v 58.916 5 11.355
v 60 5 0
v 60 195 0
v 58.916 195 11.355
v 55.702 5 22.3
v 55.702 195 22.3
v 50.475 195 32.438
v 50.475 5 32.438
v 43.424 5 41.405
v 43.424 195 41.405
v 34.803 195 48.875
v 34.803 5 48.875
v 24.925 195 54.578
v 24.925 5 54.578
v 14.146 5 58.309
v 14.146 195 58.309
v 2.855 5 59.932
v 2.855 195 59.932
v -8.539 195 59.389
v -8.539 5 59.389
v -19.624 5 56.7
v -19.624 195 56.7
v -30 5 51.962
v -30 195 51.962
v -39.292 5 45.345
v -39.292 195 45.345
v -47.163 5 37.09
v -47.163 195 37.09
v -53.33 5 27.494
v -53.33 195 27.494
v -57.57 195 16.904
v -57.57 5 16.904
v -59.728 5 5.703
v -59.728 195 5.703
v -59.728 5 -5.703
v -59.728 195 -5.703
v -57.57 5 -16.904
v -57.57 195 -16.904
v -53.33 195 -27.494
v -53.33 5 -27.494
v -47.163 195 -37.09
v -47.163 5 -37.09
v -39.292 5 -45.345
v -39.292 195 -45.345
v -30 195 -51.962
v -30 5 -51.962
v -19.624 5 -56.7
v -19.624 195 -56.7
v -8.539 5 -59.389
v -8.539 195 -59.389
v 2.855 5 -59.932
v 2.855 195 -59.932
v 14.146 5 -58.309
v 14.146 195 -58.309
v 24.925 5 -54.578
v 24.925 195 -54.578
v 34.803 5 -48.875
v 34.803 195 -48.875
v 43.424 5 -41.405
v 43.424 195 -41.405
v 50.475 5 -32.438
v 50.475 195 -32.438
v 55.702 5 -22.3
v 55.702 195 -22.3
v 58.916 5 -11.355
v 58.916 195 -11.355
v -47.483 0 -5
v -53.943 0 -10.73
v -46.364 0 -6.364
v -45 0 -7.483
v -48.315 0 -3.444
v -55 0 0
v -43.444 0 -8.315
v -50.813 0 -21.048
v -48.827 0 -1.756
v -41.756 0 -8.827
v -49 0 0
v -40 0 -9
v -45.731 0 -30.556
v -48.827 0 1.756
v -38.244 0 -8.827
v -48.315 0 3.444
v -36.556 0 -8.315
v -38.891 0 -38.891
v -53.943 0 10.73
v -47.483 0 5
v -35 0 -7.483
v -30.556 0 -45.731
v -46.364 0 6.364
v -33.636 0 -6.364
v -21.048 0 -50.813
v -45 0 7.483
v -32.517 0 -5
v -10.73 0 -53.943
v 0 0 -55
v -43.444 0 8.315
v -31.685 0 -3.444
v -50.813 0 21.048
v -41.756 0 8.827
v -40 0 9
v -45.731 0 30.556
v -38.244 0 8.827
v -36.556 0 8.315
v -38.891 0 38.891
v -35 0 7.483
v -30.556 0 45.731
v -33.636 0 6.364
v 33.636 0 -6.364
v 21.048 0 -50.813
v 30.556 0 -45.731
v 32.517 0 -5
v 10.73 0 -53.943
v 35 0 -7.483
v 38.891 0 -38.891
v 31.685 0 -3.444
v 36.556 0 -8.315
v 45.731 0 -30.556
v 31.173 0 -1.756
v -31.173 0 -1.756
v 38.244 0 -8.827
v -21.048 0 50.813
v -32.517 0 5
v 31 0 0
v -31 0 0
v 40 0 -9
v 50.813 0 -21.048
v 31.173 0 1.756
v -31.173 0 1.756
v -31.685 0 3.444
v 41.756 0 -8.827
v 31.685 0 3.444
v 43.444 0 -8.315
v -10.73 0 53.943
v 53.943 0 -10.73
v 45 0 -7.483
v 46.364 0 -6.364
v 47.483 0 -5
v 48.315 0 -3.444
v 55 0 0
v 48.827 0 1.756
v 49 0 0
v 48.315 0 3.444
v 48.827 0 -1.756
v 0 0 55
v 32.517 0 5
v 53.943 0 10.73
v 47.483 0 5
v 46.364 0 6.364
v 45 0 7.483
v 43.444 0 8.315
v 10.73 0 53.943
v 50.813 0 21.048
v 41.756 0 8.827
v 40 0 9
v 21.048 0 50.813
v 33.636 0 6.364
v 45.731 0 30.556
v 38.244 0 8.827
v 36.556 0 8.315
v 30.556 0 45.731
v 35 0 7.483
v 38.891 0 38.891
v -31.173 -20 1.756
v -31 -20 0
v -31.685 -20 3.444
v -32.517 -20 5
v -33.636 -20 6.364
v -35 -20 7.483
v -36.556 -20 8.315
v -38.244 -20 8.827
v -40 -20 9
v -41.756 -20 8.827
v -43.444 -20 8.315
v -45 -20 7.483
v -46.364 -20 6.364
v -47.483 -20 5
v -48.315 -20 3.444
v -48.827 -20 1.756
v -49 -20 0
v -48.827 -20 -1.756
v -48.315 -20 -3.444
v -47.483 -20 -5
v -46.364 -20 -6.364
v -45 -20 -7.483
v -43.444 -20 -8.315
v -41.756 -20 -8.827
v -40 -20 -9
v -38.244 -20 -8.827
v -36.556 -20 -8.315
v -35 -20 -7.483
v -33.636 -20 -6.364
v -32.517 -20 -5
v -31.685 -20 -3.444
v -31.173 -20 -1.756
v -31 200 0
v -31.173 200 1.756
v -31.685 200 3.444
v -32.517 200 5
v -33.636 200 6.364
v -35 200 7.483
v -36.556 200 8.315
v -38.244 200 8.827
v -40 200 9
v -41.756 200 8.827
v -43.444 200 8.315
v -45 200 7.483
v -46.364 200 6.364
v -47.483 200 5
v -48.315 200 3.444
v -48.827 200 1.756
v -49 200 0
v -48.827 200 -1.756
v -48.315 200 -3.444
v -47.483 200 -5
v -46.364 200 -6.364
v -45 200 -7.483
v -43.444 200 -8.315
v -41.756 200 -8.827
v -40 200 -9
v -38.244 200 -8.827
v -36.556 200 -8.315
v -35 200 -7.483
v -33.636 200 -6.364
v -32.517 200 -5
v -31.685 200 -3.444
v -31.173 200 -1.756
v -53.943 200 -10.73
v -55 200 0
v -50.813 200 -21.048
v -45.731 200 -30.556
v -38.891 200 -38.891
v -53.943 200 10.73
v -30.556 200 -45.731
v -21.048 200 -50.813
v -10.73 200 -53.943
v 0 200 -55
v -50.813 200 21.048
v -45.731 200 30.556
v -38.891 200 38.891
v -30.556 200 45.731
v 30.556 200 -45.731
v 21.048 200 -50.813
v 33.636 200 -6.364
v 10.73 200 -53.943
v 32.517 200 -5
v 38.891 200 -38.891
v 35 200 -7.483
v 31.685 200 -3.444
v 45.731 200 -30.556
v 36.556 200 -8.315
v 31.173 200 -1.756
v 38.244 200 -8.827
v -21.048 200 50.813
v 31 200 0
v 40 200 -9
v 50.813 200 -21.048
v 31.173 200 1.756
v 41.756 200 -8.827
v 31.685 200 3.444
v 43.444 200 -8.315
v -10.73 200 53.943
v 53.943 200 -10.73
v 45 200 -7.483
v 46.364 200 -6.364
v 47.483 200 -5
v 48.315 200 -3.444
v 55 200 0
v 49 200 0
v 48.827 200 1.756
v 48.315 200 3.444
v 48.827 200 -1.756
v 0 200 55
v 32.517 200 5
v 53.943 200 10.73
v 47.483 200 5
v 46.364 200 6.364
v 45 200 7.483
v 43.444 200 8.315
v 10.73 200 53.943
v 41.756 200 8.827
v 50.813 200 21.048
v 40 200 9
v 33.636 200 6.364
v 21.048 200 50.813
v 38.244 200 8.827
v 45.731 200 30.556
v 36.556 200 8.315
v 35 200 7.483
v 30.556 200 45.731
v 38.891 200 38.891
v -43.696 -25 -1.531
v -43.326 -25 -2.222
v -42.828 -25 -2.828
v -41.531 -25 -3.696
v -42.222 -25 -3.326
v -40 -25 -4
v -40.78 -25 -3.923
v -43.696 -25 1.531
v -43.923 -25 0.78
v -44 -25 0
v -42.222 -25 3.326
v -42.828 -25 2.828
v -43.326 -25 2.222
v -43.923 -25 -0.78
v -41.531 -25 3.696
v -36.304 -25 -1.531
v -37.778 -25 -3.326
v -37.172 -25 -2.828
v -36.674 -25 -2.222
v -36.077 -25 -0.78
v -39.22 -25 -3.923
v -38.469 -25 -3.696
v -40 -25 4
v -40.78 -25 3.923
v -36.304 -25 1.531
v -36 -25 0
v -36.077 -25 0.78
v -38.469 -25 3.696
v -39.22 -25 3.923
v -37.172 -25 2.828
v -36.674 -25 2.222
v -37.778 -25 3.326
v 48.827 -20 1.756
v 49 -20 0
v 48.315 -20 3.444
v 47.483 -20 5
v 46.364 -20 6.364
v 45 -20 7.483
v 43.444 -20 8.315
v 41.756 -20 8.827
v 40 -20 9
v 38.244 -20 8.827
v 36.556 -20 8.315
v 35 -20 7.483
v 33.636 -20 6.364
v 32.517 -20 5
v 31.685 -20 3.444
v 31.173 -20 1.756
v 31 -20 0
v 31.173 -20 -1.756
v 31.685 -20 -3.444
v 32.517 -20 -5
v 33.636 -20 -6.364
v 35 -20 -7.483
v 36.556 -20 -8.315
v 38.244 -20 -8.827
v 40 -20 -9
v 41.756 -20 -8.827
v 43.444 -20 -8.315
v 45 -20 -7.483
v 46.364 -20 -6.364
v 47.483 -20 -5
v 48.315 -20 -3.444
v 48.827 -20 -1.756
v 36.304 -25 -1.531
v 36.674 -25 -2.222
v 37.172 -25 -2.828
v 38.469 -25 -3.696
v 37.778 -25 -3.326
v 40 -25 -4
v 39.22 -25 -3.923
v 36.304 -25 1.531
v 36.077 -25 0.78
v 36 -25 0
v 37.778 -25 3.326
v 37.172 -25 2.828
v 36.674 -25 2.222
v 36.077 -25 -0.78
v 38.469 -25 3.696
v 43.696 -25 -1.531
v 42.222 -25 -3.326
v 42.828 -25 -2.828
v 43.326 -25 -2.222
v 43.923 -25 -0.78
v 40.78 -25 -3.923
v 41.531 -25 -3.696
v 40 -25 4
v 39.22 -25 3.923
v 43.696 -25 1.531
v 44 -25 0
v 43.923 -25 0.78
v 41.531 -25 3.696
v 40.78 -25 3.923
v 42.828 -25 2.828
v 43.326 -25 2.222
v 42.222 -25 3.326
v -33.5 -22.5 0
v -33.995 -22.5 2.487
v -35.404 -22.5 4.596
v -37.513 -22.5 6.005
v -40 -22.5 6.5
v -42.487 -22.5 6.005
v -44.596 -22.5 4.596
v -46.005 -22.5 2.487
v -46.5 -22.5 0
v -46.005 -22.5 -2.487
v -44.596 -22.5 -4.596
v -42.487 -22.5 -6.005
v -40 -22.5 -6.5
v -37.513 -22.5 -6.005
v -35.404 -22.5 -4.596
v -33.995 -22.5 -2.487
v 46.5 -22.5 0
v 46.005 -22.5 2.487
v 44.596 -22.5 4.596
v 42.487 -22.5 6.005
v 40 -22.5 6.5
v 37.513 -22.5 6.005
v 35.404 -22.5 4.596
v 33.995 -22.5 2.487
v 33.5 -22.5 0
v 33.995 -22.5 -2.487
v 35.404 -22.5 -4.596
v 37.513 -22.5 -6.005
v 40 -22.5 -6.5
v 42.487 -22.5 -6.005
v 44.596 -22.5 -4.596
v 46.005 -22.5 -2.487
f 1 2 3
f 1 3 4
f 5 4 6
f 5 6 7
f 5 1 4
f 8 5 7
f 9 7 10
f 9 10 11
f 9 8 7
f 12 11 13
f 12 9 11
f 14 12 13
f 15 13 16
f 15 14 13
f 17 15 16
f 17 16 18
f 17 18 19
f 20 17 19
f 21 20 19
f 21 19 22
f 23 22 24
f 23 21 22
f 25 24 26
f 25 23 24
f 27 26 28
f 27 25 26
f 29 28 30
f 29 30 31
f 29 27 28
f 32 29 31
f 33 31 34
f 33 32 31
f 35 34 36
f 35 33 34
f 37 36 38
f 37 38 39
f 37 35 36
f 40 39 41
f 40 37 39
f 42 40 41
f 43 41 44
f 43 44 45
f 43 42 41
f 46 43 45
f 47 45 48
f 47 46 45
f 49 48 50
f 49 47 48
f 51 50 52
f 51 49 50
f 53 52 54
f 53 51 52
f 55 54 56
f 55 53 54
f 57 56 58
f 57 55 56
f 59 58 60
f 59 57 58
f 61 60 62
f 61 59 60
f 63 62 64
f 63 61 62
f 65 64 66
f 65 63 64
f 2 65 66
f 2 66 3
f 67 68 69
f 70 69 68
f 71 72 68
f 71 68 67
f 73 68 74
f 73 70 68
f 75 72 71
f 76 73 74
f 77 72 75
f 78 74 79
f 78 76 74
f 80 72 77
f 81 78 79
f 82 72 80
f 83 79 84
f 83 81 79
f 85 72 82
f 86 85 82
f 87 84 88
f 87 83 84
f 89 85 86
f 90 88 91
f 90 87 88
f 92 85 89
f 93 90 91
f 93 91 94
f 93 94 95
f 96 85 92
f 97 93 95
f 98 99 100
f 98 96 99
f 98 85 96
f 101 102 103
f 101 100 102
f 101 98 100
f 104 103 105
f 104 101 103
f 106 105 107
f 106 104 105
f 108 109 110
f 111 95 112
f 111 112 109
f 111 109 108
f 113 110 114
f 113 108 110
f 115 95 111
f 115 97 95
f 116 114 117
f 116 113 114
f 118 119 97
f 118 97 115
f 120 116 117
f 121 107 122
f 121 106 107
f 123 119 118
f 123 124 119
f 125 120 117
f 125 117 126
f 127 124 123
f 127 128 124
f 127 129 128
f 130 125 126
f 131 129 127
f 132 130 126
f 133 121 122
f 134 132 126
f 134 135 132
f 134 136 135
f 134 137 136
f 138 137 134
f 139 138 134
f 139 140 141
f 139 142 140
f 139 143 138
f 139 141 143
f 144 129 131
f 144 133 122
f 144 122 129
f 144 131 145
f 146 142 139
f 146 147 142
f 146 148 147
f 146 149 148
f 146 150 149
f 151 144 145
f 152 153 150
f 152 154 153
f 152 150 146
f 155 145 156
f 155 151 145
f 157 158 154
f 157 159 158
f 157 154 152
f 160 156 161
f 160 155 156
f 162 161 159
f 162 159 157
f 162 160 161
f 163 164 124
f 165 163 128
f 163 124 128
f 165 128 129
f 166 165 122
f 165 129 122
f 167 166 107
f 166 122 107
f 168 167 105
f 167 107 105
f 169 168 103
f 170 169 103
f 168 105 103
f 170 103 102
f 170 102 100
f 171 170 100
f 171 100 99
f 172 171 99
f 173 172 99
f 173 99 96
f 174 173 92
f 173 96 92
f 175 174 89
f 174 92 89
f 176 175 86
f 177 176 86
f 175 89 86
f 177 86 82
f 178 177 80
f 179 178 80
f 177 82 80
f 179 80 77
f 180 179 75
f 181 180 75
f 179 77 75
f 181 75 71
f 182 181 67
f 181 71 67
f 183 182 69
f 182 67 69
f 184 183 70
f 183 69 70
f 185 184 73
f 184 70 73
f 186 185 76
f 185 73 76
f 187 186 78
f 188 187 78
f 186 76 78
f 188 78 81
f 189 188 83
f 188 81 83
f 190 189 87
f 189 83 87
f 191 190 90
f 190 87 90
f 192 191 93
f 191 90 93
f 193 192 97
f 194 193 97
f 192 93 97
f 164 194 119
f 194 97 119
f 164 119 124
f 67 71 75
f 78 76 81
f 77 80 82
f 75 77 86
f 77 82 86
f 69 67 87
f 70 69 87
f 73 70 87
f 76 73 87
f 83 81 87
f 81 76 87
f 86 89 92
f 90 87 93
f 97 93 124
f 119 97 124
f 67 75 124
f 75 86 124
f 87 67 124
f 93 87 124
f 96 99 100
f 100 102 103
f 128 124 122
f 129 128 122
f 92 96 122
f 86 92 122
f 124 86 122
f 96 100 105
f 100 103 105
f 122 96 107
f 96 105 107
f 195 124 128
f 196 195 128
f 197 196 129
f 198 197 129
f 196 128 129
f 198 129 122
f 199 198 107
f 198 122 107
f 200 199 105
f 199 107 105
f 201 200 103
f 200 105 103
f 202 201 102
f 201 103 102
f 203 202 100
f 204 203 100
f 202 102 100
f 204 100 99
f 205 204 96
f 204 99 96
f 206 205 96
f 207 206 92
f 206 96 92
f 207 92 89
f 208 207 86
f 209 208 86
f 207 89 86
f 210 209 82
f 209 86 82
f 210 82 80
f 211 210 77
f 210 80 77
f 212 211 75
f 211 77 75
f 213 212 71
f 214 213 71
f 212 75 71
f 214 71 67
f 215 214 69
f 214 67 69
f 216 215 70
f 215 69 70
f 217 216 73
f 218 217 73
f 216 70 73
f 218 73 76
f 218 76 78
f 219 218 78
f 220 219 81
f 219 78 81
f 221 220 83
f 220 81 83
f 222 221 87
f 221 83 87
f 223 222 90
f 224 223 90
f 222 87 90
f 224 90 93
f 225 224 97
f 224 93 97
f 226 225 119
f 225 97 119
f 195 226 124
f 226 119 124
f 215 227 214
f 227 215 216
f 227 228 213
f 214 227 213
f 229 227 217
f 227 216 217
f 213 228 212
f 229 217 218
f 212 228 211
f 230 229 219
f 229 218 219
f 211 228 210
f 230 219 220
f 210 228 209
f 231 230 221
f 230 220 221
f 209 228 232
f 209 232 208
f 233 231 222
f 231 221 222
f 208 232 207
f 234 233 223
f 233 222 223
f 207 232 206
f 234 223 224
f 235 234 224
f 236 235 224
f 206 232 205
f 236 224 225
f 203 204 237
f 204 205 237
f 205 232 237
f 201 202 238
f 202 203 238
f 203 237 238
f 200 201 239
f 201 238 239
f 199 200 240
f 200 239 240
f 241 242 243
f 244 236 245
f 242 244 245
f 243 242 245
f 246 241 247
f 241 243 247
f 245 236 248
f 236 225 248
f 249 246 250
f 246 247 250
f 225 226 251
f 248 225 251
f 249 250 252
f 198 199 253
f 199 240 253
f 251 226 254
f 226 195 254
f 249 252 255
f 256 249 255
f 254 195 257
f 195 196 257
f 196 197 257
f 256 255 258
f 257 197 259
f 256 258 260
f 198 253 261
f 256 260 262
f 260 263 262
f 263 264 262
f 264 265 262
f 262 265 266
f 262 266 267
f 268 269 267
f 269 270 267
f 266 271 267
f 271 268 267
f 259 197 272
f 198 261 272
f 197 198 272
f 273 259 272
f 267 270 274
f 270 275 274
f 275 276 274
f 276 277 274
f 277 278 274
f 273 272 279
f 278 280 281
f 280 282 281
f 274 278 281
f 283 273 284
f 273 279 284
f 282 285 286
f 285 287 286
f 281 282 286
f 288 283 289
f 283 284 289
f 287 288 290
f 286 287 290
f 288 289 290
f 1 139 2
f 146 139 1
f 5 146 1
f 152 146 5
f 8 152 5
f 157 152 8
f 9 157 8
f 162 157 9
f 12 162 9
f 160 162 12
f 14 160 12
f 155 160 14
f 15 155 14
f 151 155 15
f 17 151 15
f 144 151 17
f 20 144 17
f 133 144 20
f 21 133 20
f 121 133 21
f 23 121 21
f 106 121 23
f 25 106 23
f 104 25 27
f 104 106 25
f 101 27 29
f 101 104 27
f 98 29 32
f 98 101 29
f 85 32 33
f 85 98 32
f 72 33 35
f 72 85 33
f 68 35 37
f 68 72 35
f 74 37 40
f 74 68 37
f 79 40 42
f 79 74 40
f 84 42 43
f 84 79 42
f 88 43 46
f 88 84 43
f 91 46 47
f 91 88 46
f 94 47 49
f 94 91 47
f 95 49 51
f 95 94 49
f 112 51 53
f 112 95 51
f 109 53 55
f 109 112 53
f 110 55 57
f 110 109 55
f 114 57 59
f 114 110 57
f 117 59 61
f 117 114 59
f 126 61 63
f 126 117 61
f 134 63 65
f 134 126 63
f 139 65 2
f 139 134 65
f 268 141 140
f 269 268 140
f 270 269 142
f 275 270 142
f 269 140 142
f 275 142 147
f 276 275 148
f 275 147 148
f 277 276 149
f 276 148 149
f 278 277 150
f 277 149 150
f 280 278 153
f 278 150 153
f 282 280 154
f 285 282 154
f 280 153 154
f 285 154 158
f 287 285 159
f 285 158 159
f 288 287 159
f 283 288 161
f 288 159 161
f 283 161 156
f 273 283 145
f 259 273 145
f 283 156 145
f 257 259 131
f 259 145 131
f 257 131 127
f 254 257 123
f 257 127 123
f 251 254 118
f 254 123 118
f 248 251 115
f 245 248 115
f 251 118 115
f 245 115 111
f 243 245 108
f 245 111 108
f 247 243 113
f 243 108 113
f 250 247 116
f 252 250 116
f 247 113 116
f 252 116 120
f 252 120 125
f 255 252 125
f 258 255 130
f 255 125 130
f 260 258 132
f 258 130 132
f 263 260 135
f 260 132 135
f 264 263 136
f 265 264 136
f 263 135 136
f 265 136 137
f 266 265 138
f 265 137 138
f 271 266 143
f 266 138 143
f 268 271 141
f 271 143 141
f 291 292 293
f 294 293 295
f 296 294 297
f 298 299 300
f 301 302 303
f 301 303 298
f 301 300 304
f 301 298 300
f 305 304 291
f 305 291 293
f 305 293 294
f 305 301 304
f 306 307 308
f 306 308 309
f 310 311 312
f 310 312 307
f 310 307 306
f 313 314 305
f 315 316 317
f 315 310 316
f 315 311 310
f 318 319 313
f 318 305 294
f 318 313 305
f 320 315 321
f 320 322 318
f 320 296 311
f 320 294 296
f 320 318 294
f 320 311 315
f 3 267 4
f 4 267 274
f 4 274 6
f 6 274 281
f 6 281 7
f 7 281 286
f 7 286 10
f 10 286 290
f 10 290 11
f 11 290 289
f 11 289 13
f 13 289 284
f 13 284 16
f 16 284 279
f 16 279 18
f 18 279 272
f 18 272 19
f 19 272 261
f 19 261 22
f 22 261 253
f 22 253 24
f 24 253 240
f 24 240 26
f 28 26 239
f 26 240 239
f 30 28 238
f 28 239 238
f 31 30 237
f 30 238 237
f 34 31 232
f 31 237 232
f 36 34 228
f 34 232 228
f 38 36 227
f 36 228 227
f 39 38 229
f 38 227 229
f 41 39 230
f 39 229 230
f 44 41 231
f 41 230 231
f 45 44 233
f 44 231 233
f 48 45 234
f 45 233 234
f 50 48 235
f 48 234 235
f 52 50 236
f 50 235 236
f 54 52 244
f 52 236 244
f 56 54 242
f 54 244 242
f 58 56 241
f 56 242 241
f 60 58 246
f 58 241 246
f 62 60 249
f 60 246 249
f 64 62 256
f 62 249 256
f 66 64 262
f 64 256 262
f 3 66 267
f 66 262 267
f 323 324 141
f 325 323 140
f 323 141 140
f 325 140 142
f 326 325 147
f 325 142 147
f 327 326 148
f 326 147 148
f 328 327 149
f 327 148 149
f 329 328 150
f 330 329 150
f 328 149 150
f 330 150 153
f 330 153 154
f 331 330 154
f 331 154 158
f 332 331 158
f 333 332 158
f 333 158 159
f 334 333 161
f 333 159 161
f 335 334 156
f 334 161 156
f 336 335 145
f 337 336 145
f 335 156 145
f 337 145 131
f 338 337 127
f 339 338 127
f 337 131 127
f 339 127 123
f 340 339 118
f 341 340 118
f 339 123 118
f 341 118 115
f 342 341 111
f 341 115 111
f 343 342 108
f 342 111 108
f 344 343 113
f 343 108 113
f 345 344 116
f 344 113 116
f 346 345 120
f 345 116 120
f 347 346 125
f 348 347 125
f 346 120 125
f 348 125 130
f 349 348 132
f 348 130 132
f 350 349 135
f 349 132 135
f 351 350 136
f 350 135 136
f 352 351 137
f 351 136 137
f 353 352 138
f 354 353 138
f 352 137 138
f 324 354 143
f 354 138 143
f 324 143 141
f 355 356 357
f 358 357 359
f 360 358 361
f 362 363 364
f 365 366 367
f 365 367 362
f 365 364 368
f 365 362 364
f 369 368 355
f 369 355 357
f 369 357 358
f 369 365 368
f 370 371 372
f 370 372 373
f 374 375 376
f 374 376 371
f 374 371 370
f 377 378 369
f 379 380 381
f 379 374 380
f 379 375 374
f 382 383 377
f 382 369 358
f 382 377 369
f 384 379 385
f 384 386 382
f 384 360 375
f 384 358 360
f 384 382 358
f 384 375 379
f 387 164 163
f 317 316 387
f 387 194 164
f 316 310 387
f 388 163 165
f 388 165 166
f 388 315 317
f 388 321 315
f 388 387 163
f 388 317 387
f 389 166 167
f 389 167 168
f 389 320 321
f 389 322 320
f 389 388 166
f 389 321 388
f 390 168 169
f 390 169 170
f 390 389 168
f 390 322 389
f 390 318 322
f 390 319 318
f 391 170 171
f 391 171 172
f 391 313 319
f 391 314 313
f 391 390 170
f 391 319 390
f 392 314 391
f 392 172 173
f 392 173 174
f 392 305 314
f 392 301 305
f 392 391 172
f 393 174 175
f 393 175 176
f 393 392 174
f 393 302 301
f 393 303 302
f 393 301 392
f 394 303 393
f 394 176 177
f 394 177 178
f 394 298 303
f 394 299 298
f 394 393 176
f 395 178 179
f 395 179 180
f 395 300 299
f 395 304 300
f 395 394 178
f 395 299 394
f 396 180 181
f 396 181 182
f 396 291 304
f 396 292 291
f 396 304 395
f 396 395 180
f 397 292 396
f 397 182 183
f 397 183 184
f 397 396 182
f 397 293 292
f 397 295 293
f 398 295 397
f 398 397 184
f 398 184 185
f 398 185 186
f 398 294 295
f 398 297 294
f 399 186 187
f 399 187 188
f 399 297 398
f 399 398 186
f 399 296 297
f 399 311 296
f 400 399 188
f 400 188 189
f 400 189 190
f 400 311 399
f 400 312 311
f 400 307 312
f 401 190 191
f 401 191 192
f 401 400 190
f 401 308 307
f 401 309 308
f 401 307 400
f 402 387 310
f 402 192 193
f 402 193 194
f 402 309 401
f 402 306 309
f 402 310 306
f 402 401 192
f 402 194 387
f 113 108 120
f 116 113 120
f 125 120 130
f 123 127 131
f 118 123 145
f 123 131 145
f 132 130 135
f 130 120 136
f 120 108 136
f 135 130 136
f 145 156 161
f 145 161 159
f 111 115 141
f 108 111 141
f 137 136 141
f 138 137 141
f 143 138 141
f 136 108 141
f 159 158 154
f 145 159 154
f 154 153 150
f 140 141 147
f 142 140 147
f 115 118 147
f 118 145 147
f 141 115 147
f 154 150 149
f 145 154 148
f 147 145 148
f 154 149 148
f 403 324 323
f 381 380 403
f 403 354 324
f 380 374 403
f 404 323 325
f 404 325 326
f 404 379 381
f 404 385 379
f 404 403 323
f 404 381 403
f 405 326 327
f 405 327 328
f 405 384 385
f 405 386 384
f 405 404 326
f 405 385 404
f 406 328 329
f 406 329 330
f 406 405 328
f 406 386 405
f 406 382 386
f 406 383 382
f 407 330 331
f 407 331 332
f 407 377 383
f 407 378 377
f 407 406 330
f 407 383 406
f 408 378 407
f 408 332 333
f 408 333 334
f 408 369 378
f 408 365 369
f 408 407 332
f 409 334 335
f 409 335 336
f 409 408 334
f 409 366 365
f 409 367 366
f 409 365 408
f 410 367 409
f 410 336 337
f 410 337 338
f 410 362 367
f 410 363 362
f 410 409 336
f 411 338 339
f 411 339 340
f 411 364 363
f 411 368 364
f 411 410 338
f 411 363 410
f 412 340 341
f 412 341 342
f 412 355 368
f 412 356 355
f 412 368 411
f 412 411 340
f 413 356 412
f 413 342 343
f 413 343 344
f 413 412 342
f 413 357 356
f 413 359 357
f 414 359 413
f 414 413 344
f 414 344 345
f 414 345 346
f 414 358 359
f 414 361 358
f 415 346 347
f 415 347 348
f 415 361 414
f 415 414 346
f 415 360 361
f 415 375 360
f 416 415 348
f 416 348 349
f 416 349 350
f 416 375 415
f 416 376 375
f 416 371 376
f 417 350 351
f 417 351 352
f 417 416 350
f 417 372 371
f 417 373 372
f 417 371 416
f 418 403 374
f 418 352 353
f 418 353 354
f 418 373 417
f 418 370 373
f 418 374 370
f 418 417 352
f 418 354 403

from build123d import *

# Parameters (mm, degrees)
F0_R      = 9
F1_DEPTH  = 25
F0_R_2    = 60
F2_DEPTH  = 200
F3_SIZE   = 5
F3_2_SIZE = 5
F4_SIZE   = 5


with BuildPart() as f1:
    # F0 (on Front) → F1 (new body)
    with BuildSketch(Plane.XZ):
        with Locations((-40, 0)):
            Circle(F0_R)
        with Locations((40, 0)):
            Circle(F0_R)
    extrude(amount=F1_DEPTH)

    # F3#2
    f3_2_edges = [f1.edges().sort_by_distance(p)[0] for p in [
        (-49, -25, 0),
    ]]
    chamfer(f3_2_edges, length=F3_2_SIZE)

    # F4
    f4_edges = [f1.edges().sort_by_distance(p)[0] for p in [
        (31, -25, 0),
    ]]
    chamfer(f4_edges, length=F4_SIZE)


with BuildPart() as f2:
    # F0 (on Front) → F2 (new body)
    with BuildSketch(Plane.XZ):
        Circle(F0_R_2)
        with Locations((-40, 0)):
            Circle(F0_R, mode=Mode.SUBTRACT)
        with Locations((40, 0)):
            Circle(F0_R, mode=Mode.SUBTRACT)
    extrude(amount=-F2_DEPTH)

    # F3
    f3_edges = [f2.edges().sort_by_distance(p)[0] for p in [
        (-60, 200, 0),
        (60, 100, 0),
        (-60, 0, 0),
    ]]
    chamfer(f3_edges, length=F3_SIZE)


solid = Compound([f1.part, f2.part])
